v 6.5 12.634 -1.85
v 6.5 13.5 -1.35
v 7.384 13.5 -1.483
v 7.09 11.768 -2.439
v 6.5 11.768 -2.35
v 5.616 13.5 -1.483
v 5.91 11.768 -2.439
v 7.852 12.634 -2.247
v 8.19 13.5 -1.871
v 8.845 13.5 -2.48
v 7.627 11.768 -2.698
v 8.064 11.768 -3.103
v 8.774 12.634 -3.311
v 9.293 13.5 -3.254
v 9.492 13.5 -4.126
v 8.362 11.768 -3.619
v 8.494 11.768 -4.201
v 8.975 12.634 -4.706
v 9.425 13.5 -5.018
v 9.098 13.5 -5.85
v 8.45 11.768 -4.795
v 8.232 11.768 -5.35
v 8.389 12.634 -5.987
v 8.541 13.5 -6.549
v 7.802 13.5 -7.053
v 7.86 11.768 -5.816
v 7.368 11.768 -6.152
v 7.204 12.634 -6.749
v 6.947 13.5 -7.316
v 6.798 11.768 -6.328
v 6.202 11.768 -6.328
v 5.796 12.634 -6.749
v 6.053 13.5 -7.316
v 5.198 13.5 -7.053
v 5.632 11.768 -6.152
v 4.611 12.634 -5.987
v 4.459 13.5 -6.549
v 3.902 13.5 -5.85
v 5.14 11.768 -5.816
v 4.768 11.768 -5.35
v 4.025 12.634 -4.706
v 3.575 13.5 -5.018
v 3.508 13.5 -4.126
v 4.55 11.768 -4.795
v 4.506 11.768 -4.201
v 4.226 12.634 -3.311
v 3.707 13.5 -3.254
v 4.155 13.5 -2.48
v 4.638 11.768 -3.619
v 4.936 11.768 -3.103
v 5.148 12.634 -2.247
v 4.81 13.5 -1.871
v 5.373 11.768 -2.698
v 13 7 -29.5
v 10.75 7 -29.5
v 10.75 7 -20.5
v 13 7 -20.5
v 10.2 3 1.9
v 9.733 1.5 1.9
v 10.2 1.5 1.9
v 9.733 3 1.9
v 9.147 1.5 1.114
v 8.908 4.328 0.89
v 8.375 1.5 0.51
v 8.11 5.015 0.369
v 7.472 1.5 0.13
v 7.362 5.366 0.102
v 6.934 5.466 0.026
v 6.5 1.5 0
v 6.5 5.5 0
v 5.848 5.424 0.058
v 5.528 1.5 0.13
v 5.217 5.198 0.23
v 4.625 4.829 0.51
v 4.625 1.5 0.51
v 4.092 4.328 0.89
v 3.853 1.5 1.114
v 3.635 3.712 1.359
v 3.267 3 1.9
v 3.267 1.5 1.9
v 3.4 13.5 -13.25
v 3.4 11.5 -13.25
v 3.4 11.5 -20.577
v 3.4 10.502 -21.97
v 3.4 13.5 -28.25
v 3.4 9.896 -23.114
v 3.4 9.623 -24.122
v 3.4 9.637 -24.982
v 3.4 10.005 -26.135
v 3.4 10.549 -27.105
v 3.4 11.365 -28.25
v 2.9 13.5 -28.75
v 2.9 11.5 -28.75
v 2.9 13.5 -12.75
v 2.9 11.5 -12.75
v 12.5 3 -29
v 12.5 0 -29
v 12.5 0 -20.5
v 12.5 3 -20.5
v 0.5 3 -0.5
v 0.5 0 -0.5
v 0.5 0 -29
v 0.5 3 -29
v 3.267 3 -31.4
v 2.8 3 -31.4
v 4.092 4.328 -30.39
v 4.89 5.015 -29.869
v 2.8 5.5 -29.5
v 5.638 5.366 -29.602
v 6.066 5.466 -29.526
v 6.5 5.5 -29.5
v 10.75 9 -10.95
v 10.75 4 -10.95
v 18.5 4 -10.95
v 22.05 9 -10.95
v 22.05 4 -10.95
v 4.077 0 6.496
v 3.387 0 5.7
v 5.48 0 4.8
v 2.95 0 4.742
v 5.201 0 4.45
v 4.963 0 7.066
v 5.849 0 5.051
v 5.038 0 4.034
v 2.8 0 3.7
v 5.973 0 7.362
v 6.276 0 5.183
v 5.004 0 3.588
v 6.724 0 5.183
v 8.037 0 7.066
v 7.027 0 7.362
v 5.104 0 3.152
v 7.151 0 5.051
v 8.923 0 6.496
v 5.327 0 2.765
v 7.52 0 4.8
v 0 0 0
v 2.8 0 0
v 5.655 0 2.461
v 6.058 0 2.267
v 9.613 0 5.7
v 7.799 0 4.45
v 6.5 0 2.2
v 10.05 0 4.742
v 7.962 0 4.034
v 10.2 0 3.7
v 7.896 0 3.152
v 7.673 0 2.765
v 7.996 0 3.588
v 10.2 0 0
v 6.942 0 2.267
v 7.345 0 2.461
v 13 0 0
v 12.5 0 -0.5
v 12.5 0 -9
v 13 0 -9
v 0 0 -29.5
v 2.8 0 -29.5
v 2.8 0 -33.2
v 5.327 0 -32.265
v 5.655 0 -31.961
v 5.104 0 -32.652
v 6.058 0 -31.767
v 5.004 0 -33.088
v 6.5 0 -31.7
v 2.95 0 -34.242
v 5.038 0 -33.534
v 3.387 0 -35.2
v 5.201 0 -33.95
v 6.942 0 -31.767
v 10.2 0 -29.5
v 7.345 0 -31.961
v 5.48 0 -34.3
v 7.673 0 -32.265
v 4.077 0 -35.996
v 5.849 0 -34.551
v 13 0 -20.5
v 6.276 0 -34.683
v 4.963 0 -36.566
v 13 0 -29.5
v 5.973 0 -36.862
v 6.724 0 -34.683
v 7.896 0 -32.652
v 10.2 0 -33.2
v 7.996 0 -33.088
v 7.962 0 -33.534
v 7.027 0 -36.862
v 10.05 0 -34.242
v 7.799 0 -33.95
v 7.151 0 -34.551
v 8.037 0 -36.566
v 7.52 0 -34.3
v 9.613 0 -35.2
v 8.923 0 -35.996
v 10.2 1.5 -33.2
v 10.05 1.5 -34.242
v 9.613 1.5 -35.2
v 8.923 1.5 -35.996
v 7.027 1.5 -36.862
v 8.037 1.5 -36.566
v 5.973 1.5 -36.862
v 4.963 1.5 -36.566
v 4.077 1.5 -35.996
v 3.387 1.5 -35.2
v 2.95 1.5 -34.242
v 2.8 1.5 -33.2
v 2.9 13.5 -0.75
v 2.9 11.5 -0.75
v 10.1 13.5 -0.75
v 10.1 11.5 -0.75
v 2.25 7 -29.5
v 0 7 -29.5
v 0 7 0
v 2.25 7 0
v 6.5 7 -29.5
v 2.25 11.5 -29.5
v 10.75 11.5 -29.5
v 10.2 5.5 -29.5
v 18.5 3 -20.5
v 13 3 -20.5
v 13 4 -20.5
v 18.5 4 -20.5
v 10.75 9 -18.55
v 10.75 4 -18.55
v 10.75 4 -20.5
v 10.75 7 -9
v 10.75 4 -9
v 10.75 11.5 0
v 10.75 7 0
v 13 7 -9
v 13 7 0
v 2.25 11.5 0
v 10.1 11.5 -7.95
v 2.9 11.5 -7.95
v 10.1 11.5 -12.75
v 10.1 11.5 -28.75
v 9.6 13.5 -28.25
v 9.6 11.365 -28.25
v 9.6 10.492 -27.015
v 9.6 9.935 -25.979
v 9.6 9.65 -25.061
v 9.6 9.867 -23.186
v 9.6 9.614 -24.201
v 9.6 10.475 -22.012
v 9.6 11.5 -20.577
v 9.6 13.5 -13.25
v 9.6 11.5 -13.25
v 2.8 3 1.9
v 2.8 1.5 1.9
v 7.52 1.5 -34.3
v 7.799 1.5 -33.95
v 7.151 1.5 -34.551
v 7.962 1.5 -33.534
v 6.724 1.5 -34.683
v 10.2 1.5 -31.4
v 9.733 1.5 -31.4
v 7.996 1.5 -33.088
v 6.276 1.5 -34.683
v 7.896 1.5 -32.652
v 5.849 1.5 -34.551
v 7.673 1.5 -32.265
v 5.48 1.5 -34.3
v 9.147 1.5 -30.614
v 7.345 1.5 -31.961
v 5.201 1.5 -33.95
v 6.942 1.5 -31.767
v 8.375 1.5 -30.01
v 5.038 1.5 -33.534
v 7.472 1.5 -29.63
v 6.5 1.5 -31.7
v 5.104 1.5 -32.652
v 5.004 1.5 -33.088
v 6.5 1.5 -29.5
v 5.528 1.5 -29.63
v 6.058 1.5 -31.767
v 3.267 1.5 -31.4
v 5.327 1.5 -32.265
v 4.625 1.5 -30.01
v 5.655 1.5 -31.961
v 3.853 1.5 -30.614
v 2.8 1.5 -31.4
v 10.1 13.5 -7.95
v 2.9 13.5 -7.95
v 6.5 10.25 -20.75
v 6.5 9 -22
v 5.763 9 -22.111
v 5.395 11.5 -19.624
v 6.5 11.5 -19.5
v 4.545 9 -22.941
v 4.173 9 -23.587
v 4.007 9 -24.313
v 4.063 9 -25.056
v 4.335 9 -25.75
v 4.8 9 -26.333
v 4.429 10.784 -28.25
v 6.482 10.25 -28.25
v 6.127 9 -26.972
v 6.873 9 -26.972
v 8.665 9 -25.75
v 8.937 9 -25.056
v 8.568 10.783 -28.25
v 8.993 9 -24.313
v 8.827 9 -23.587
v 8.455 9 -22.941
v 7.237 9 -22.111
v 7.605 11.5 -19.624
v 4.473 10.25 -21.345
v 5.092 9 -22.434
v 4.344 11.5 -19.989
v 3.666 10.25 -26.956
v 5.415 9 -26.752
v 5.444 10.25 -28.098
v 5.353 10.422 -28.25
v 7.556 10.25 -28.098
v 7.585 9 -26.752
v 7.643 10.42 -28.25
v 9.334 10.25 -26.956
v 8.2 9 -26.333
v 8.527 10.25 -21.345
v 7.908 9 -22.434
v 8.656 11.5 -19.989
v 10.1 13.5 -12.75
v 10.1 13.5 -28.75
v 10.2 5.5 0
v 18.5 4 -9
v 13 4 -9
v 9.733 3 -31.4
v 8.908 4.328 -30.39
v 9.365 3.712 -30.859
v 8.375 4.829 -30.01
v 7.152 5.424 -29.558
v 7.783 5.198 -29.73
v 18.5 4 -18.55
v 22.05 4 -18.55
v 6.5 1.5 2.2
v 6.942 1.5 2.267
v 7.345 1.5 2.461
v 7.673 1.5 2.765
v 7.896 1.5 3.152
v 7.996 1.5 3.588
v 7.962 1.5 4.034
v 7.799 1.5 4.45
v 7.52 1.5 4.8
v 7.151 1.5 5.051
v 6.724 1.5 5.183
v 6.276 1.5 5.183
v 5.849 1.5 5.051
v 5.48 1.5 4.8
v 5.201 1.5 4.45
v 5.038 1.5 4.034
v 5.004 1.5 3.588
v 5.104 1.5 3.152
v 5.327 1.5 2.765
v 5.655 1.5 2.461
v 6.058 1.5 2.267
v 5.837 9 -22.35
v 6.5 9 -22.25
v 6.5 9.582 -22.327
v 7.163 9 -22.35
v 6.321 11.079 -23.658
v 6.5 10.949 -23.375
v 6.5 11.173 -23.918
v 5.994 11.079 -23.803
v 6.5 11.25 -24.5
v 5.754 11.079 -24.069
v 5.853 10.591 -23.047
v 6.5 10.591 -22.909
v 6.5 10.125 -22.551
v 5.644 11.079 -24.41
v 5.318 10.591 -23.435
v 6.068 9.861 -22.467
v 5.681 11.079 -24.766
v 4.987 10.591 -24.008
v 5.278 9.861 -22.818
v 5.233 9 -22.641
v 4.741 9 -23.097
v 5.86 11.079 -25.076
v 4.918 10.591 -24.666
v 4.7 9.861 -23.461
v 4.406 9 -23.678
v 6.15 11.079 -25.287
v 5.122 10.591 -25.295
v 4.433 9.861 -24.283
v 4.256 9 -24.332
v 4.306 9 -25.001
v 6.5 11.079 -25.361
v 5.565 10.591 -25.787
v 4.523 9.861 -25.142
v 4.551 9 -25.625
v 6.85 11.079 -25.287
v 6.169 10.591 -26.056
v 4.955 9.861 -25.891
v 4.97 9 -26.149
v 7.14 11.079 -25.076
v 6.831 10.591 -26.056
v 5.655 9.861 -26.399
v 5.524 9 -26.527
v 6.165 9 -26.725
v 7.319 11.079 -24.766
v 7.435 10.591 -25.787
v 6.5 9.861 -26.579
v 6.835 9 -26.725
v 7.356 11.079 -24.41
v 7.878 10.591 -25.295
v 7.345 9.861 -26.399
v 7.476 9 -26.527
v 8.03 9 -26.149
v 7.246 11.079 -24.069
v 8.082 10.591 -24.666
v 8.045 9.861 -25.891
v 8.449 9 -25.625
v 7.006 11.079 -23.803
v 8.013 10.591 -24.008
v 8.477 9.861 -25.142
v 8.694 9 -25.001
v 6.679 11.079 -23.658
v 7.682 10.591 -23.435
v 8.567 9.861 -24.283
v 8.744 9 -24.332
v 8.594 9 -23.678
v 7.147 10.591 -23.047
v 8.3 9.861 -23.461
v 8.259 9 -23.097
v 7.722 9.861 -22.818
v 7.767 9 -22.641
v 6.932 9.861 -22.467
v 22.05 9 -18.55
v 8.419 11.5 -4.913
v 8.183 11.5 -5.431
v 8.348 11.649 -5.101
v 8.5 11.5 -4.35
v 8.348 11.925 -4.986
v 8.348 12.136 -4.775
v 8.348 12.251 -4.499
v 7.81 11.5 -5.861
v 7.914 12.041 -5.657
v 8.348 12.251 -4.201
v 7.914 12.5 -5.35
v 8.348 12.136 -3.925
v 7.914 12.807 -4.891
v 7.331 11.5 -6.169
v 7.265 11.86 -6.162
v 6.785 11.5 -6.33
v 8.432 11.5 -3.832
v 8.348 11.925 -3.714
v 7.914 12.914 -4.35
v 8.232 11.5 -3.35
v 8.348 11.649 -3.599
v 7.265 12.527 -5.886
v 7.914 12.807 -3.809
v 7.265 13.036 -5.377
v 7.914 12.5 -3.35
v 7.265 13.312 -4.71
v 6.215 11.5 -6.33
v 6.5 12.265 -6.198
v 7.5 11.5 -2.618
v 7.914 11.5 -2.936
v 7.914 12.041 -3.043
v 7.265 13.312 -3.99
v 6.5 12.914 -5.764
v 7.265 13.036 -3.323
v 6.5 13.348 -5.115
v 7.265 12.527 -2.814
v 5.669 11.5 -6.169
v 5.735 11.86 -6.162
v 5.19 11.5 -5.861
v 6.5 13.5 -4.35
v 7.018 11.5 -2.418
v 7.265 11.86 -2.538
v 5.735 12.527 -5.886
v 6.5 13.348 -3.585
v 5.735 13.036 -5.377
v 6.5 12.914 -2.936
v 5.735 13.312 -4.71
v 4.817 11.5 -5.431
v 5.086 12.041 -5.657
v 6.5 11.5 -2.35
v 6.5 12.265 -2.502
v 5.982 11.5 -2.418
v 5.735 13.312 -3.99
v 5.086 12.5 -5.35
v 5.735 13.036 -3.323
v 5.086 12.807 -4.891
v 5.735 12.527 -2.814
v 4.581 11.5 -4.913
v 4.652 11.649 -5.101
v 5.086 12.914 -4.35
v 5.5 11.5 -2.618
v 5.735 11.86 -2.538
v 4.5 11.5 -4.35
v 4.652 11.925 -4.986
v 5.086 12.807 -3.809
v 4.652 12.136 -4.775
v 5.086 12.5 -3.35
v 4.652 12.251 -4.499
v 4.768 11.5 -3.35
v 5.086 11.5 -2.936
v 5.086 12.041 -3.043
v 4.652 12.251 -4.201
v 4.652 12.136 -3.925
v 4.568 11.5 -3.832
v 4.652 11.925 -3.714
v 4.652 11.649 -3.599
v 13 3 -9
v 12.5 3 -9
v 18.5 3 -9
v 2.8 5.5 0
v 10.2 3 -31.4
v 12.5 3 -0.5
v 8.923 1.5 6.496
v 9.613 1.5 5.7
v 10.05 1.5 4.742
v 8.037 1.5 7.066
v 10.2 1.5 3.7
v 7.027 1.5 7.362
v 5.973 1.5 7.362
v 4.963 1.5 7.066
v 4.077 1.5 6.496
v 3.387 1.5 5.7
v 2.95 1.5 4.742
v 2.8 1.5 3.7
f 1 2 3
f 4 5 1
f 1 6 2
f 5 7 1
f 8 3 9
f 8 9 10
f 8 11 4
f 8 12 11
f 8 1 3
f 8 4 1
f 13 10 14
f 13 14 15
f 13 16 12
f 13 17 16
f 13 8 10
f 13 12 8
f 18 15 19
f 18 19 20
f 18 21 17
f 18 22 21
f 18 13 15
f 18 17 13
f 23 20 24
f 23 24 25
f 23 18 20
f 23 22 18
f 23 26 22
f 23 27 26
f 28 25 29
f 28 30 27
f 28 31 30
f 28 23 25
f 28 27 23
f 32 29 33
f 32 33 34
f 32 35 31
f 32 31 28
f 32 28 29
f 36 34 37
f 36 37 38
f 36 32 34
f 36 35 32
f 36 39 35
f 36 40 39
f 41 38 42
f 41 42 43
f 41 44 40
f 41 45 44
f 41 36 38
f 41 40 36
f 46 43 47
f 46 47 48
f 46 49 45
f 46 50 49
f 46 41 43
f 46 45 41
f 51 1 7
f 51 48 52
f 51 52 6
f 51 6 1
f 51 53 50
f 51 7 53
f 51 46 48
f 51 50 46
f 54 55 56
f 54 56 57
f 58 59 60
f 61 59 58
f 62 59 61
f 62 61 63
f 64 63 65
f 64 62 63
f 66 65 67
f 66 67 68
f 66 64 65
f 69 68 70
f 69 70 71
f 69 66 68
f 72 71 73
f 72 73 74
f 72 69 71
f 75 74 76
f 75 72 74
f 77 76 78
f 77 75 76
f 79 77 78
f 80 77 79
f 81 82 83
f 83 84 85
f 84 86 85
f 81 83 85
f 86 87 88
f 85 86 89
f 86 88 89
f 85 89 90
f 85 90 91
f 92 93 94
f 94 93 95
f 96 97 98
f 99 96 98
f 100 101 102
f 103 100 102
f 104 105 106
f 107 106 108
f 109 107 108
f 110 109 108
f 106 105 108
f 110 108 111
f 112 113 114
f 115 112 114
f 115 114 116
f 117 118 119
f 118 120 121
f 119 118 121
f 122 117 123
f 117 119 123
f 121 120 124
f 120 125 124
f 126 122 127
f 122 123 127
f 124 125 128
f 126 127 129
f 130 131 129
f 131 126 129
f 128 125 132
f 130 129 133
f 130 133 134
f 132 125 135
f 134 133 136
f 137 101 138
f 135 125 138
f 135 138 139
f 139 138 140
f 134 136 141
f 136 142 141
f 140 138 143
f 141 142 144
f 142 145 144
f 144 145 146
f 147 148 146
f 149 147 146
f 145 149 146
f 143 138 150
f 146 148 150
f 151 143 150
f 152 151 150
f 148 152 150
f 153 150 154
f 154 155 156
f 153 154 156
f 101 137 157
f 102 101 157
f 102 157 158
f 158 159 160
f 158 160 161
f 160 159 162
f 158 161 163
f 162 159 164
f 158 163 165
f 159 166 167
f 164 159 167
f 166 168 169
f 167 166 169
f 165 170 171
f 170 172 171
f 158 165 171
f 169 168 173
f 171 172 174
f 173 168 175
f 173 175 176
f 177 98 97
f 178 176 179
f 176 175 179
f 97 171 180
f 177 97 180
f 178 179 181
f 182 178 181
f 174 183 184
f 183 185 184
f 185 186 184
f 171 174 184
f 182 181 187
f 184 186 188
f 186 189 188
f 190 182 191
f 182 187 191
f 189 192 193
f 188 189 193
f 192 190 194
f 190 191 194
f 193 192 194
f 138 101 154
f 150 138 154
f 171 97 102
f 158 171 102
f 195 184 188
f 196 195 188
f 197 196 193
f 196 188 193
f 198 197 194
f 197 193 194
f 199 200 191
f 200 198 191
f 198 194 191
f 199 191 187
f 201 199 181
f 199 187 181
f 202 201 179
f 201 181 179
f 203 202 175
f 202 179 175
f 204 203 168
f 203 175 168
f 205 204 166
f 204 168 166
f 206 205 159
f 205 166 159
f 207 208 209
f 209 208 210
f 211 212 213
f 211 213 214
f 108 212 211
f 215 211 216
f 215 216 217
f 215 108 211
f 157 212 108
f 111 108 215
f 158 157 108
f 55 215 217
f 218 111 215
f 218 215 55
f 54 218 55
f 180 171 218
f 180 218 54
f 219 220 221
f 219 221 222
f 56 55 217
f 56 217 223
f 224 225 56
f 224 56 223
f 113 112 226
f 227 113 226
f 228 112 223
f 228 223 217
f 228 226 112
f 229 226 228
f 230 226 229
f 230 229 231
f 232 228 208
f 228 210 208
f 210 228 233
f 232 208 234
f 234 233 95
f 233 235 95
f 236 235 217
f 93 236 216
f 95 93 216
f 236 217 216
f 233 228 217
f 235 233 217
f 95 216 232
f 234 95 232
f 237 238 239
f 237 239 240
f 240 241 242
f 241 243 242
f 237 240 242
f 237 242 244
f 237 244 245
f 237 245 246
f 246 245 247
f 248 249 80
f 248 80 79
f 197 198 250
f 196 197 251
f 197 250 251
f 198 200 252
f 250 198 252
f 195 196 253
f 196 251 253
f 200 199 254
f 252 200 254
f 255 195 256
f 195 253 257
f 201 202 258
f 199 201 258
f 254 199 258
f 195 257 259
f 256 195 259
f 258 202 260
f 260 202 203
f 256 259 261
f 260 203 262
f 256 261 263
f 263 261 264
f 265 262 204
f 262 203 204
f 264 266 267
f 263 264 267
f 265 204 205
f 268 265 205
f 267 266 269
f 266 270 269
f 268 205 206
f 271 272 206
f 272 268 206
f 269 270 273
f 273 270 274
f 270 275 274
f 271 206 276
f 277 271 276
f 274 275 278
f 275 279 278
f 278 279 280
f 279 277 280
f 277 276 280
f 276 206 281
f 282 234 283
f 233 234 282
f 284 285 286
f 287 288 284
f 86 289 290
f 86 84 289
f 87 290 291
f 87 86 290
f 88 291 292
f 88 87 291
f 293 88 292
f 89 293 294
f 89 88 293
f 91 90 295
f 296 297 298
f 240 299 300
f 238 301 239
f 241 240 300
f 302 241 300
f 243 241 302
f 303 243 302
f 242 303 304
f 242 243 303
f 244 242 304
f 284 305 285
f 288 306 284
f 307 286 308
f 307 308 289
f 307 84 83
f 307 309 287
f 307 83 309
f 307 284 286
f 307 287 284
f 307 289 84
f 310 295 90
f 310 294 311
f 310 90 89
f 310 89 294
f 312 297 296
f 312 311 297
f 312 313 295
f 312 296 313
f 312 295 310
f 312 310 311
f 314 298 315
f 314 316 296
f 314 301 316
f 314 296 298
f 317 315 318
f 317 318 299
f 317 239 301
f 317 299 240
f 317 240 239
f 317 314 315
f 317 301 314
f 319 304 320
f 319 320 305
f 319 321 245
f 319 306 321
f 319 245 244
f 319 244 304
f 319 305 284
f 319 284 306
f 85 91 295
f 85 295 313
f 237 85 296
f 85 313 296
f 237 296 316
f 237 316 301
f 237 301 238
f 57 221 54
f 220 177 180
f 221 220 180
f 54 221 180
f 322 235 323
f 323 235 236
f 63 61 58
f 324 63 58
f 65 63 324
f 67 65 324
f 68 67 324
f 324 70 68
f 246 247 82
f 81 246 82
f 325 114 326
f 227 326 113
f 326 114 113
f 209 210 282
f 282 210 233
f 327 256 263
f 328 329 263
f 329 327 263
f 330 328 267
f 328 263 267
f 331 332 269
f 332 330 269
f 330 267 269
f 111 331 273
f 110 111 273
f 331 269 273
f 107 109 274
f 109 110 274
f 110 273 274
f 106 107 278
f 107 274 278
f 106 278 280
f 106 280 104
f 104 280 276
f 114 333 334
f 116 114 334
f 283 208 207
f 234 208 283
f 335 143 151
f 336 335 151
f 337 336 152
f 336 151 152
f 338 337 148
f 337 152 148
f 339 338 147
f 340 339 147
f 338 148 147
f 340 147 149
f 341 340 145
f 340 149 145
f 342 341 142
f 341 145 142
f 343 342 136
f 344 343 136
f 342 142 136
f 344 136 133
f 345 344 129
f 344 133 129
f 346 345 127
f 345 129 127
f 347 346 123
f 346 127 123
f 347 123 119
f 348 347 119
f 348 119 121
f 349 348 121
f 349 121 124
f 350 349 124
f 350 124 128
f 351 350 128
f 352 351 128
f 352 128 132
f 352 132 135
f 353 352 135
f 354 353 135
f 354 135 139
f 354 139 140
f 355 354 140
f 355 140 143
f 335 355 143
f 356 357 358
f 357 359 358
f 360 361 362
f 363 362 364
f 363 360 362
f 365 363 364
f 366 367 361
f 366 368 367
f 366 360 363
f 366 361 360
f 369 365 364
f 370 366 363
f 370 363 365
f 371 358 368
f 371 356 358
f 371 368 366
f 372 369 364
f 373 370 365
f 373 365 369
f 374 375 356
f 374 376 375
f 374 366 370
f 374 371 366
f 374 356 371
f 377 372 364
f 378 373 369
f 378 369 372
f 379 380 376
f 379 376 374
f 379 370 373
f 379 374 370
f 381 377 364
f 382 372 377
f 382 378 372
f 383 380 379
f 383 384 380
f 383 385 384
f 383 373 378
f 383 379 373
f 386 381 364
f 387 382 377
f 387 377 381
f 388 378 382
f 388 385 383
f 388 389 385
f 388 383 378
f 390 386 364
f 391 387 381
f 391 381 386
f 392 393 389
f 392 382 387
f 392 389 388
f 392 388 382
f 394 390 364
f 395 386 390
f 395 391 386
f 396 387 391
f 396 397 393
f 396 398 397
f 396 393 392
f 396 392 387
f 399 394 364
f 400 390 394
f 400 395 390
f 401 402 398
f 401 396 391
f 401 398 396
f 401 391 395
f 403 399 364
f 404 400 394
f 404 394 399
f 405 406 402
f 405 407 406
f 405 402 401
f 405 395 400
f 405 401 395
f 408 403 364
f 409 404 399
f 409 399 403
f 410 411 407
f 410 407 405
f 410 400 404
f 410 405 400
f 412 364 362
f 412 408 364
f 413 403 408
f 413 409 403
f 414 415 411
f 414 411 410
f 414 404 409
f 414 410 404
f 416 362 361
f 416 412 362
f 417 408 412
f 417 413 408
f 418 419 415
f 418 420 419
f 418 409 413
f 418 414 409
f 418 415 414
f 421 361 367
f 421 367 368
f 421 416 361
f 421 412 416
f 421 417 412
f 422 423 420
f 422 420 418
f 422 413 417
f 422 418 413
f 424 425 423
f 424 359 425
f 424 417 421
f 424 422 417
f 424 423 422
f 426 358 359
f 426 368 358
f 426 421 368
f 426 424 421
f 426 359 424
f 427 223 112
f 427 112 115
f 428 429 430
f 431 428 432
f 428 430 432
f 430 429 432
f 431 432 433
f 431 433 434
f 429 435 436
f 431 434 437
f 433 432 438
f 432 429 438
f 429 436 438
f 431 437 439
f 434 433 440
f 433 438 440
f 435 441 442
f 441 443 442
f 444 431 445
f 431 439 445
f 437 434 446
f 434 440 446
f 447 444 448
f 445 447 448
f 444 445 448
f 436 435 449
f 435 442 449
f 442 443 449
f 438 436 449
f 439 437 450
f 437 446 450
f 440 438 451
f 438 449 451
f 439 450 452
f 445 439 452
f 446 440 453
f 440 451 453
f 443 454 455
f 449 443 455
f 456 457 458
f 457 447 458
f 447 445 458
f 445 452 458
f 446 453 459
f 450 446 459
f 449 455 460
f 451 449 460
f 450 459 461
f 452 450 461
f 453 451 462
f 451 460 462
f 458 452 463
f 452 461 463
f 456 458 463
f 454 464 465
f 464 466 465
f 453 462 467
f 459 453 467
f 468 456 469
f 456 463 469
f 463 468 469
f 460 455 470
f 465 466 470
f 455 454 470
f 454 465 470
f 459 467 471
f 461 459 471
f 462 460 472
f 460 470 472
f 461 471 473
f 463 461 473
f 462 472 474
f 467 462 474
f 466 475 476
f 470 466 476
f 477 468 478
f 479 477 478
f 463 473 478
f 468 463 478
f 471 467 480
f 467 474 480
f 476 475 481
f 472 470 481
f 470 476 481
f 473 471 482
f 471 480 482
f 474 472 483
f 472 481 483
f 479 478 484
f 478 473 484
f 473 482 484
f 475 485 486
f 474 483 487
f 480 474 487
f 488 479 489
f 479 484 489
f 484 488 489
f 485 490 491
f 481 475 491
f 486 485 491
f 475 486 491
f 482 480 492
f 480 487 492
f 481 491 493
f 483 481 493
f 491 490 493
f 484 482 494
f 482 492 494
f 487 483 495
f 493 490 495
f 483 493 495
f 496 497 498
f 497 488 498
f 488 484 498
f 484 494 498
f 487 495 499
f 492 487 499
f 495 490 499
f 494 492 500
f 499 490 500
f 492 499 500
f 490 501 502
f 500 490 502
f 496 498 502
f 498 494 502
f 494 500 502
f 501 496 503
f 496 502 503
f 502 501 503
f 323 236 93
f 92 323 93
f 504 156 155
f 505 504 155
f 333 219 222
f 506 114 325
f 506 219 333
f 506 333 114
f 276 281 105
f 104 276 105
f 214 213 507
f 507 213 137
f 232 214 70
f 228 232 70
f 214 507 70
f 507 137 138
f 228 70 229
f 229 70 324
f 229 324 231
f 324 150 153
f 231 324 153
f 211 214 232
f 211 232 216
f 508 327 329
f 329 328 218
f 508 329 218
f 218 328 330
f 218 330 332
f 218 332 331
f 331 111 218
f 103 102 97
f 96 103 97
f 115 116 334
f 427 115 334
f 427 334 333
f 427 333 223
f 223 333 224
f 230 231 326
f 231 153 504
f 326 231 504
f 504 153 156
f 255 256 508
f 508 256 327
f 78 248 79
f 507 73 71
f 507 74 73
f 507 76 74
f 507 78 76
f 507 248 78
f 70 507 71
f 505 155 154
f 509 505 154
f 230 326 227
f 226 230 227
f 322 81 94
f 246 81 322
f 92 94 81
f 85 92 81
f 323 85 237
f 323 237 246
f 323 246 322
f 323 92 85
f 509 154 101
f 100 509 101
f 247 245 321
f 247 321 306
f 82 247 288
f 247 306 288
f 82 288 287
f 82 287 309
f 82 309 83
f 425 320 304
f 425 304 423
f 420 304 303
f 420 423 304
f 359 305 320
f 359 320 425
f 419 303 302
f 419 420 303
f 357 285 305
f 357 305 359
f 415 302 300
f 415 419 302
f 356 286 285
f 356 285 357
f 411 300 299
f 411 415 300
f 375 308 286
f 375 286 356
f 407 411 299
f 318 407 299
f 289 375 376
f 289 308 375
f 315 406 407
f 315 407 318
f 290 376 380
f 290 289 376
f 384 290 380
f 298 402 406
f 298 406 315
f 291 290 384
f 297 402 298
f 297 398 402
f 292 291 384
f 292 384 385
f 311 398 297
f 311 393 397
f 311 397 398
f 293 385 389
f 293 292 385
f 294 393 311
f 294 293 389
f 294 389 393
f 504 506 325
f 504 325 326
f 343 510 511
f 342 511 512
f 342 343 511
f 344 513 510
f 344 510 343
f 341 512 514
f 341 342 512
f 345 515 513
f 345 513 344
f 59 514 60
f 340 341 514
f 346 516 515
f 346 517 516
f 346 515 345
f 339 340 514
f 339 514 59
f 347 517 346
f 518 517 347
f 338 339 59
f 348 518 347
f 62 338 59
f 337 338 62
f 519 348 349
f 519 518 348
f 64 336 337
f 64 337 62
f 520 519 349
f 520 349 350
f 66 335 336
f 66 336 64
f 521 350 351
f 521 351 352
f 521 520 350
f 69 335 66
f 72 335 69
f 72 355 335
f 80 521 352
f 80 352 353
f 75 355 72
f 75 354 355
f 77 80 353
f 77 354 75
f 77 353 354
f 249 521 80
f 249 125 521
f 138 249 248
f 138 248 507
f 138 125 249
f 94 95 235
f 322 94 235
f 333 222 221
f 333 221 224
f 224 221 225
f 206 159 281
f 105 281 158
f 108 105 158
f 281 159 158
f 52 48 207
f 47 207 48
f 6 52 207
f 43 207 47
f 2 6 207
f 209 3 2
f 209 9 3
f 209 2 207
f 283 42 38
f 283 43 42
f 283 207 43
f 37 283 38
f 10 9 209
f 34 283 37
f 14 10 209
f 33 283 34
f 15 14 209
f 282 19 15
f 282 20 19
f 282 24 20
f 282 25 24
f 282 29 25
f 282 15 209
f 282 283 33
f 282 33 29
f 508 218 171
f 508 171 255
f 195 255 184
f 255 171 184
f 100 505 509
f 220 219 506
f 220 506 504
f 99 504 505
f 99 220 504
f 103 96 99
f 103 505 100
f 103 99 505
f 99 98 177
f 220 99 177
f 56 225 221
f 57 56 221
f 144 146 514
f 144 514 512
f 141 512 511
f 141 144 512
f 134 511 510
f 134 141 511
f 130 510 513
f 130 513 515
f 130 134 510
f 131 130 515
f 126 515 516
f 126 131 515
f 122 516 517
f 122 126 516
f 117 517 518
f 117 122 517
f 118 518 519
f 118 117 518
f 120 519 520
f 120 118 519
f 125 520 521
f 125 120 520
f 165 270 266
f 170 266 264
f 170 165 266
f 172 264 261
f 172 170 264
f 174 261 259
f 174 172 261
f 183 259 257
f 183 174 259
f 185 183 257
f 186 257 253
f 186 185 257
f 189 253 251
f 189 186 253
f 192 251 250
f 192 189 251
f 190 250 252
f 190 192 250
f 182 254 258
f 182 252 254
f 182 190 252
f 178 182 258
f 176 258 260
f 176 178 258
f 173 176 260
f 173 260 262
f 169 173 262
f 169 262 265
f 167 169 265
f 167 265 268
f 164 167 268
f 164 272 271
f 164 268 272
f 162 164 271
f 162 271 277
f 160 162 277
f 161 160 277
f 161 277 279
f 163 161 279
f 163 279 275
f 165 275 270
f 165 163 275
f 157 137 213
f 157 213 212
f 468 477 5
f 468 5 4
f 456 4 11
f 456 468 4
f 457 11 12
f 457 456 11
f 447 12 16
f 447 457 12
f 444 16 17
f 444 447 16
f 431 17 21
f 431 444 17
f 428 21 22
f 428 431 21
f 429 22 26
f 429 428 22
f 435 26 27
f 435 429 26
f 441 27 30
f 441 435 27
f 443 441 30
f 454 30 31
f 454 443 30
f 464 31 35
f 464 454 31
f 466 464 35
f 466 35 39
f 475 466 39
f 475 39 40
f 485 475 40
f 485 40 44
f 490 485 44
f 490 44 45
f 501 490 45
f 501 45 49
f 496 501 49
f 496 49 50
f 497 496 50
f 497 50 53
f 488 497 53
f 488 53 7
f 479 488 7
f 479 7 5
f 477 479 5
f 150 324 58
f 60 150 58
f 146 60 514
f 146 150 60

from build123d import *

# Parameters (mm, degrees)
SKETCH_1_W          = 13
SKETCH_1_H          = 29.5
EXTRUDE_1_DEPTH     = 7
EXTRUDE_2_DEPTH     = 4.5
SKETCH_3_W          = 7.2
SKETCH_3_H          = 7.2
SKETCH_3_R          = 2
SKETCH_3_H_2        = 16
SKETCH_3_W_2        = 6.2
SKETCH_3_H_3        = 15
EXTRUDE_3_DEPTH     = 2
CHAMFER_1_SIZE      = 1
CHAMFER_1_SIZE2     = 1.732050808
EXTRUDE_4_DEPTH     = 2
SKETCH_8_R          = 1.5
EXTRUDE_5_DEPTH     = 5.5
CUT_EXTRUDE_1_DEPTH = 35.949964235
SKETCH_10_R         = 3.7
CUT_EXTRUDE_2_DEPTH = 5.5
CUT_EXTRUDE_3_DEPTH = 3
CUT_EXTRUDE_4_DEPTH = 41.507530164
EXTRUDE_6_DEPTH     = 1
SKETCH_14_W         = 11.3
SKETCH_14_H         = 7.6
EXTRUDE_7_DEPTH     = 5


with BuildPart() as part:
    # Эскиз1 → Бобышка-Вытянуть1 (new body)
    with BuildSketch(Plane(origin=(0, 0, 0), x_dir=(1, 0, 0), z_dir=(0, 1, 0))):
        with Locations((6.5, 14.75)):
            Rectangle(SKETCH_1_W, SKETCH_1_H)
    extrude_1 = extrude(amount=EXTRUDE_1_DEPTH)

    # Эскиз2 → Бобышка-Вытянуть2 (add)
    with BuildSketch(Plane(origin=(0, 7, 0), x_dir=(1, 0, 0), z_dir=(0, 1, 0))):
        Polygon((6.5, 29.5), (10.75, 29.5), (10.75, 0), (2.25, 0), (2.25, 29.5), align=None)
    extrude(amount=EXTRUDE_2_DEPTH)

    # Эскиз5 → Вырез-Повернуть2 (revolve, cut)
    with BuildSketch(Plane(origin=(6.5, 0, 0), x_dir=(0, 0, -1), z_dir=(1, 0, 0))):
        with BuildLine():
            Line((29.5, 11.5), (24.5, 11.5))
            Line((24.5, 11.5), (24.5, 11.25))
            ThreePointArc((24.5, 11.25), (26.090990258, 10.590990258), (26.75, 9))
            Line((26.75, 9), (27, 9))
            Line((27, 9), (29.5, 11.5))
        make_face()
    revolve(axis=Axis((6.5, 11.5, -24.5), (0, -1, 0)), mode=Mode.SUBTRACT)

    # Эскиз3 → Бобышка-Вытянуть3 (add)
    # profile 1 of 2: a face of its own
    with BuildSketch(Plane(origin=(0, 11.5, 0), x_dir=(1, 0, 0), z_dir=(0, 1, 0))):
        with Locations((6.5, 4.35)):
            Rectangle(SKETCH_3_W, SKETCH_3_H)
        with Locations((6.5, 4.35)):
            Circle(SKETCH_3_R, mode=Mode.SUBTRACT)
    # profile 2 of 2: a face of its own
    with BuildSketch(Plane(origin=(0, 11.5, 0), x_dir=(1, 0, 0), z_dir=(0, 1, 0))):
        with Locations((6.5, 20.75)):
            Rectangle(SKETCH_3_W, SKETCH_3_H_2)
        with Locations((6.5, 20.75)):
            Rectangle(SKETCH_3_W_2, SKETCH_3_H_3, mode=Mode.SUBTRACT)
    extrude(amount=EXTRUDE_3_DEPTH)

    # Эскиз4 → Повернуть1 (revolve)
    with BuildSketch(Plane(origin=(0, 11.5, 0), x_dir=(1, 0, 0), z_dir=(0, 1, 0))):
        with BuildLine():
            Line((4.5, 4.35), (6.5, 4.35))
            Line((6.5, 4.35), (8.5, 4.35))
            ThreePointArc((8.5, 4.35), (6.5, 6.35), (4.5, 4.35))
        make_face()
    revolve(axis=Axis((6.5, 11.5, -4.35), (1, 0, 0)))

    # Фаска1
    chamfer_1_edges = [part.edges().sort_by_distance(p)[0] for p in [
        (4.5, 13.5, -4.35),
    ]]
    chamfer_1_side = [part.faces().sort_by_distance(p)[0] for p in [
        (6.5, 13.5, -0.851823376),
    ]]
    chamfer(chamfer_1_edges, length=CHAMFER_1_SIZE, length2=CHAMFER_1_SIZE2, reference=chamfer_1_side[0])

    # Эскиз7 → Бобышка-Вытянуть4 (add)
    with BuildSketch(Plane(origin=(0, 11.5, 0), x_dir=(1, 0, 0), z_dir=(0, 1, 0))):
        Polygon((2.25, 29.5), (10.75, 29.5), (10.75, 28.25), (10.75, 20.186921916), (9.6, 20.186921916), (9.6, 28.25), (3.4, 28.25), (3.4, 20.186921916), (2.25, 20.186921916), (2.25, 28.25), align=None)
    extrude(amount=-EXTRUDE_4_DEPTH)

    # Эскиз8 → Бобышка-Вытянуть5 (add)
    with BuildSketch(Plane(origin=(0, 0, 0), x_dir=(-1, 0, 0), z_dir=(0, -1, 0))):
        with BuildLine():
            Line((-2.8, -3.7), (-2.8, 0))
            Line((-2.8, 0), (-10.2, 0))
            Line((-10.2, 0), (-10.2, -3.7))
            ThreePointArc((-10.2, -3.7), (-6.5, -7.4), (-2.8, -3.7))
        make_face()
        with Locations((-6.5, -3.7)):
            Circle(SKETCH_8_R, mode=Mode.SUBTRACT)
    extrude_5 = extrude(amount=-EXTRUDE_5_DEPTH)

    # Эскиз9 → Вырез-Вытянуть1 (cut, through all)
    with BuildSketch(Plane.ZY):
        Polygon((7.4, 8.09796148), (0, 5.5), (1.9, 3), (1.9, 1.5), (7.4, 1.5), (10.785462846, 4.144098561), align=None)
    cut_extrude_1 = extrude(amount=-CUT_EXTRUDE_1_DEPTH, mode=Mode.SUBTRACT)

    # Эскиз10 → Вырез-Вытянуть2 (cut)
    with BuildSketch(Plane(origin=(0, 1.5, 0), x_dir=(1, 0, 0), z_dir=(0, 1, 0))):
        with Locations((6.5, -3.7)):
            Circle(SKETCH_10_R)
    cut_extrude_2 = extrude(amount=CUT_EXTRUDE_2_DEPTH, mode=Mode.SUBTRACT)

    # Зеркальное отражение1: Бобышка-Вытянуть1, Бобышка-Вытянуть5, Вырез-Вытянуть1, Вырез-Вытянуть2 across plane
    add(extrude_1.mirror(Plane(origin=(0, 0, -14.75), x_dir=(1, 0, 0), z_dir=(0, 0, -1))))
    add(extrude_5.mirror(Plane(origin=(0, 0, -14.75), x_dir=(1, 0, 0), z_dir=(0, 0, -1))))
    add(cut_extrude_1.mirror(Plane(origin=(0, 0, -14.75), x_dir=(1, 0, 0), z_dir=(0, 0, -1))), mode=Mode.SUBTRACT)
    add(cut_extrude_2.mirror(Plane(origin=(0, 0, -14.75), x_dir=(1, 0, 0), z_dir=(0, 0, -1))), mode=Mode.SUBTRACT)

    # Эскиз11 → Вырез-Вытянуть3 (cut)
    with BuildSketch(Plane(origin=(0, 0, 0), x_dir=(-1, 0, 0), z_dir=(0, -1, 0))):
        Polygon((-12.5, 9), (-12.5, 0.5), (-0.5, 0.5), (-0.5, 29), (-12.5, 29), (-12.5, 20.5), (-15.183114384, 20.5), (-15.183114384, 9), align=None)
    extrude(amount=-CUT_EXTRUDE_3_DEPTH, mode=Mode.SUBTRACT)

    # Эскиз12 → Вырез-Вытянуть4 (cut, through all)
    with BuildSketch(Plane(origin=(0, 3, 0), x_dir=(-1, 0, 0), z_dir=(0, -1, 0))):
        Polygon((-13, 20.5), (-13, 9), (-12.5, 9), (-10.75, 9), (-10.75, 20.5), (-12.5, 20.5), align=None)
    extrude(amount=-CUT_EXTRUDE_4_DEPTH, mode=Mode.SUBTRACT)

    # Эскиз13 → Бобышка-Вытянуть6 (add)
    with BuildSketch(Plane(origin=(0, 3, 0), x_dir=(-1, 0, 0), z_dir=(0, -1, 0))):
        Polygon((-10.75, 9), (-10.75, 20.5), (-13, 20.5), (-18.5, 20.5), (-18.5, 9), align=None)
    extrude(amount=-EXTRUDE_6_DEPTH)

    # Эскиз14 → Бобышка-Вытянуть7 (add)
    with BuildSketch(Plane(origin=(0, 4, 0), x_dir=(1, 0, 0), z_dir=(0, 1, 0))):
        with Locations((16.4, 14.75)):
            Rectangle(SKETCH_14_W, SKETCH_14_H)
    extrude(amount=EXTRUDE_7_DEPTH)


solid = part.part
